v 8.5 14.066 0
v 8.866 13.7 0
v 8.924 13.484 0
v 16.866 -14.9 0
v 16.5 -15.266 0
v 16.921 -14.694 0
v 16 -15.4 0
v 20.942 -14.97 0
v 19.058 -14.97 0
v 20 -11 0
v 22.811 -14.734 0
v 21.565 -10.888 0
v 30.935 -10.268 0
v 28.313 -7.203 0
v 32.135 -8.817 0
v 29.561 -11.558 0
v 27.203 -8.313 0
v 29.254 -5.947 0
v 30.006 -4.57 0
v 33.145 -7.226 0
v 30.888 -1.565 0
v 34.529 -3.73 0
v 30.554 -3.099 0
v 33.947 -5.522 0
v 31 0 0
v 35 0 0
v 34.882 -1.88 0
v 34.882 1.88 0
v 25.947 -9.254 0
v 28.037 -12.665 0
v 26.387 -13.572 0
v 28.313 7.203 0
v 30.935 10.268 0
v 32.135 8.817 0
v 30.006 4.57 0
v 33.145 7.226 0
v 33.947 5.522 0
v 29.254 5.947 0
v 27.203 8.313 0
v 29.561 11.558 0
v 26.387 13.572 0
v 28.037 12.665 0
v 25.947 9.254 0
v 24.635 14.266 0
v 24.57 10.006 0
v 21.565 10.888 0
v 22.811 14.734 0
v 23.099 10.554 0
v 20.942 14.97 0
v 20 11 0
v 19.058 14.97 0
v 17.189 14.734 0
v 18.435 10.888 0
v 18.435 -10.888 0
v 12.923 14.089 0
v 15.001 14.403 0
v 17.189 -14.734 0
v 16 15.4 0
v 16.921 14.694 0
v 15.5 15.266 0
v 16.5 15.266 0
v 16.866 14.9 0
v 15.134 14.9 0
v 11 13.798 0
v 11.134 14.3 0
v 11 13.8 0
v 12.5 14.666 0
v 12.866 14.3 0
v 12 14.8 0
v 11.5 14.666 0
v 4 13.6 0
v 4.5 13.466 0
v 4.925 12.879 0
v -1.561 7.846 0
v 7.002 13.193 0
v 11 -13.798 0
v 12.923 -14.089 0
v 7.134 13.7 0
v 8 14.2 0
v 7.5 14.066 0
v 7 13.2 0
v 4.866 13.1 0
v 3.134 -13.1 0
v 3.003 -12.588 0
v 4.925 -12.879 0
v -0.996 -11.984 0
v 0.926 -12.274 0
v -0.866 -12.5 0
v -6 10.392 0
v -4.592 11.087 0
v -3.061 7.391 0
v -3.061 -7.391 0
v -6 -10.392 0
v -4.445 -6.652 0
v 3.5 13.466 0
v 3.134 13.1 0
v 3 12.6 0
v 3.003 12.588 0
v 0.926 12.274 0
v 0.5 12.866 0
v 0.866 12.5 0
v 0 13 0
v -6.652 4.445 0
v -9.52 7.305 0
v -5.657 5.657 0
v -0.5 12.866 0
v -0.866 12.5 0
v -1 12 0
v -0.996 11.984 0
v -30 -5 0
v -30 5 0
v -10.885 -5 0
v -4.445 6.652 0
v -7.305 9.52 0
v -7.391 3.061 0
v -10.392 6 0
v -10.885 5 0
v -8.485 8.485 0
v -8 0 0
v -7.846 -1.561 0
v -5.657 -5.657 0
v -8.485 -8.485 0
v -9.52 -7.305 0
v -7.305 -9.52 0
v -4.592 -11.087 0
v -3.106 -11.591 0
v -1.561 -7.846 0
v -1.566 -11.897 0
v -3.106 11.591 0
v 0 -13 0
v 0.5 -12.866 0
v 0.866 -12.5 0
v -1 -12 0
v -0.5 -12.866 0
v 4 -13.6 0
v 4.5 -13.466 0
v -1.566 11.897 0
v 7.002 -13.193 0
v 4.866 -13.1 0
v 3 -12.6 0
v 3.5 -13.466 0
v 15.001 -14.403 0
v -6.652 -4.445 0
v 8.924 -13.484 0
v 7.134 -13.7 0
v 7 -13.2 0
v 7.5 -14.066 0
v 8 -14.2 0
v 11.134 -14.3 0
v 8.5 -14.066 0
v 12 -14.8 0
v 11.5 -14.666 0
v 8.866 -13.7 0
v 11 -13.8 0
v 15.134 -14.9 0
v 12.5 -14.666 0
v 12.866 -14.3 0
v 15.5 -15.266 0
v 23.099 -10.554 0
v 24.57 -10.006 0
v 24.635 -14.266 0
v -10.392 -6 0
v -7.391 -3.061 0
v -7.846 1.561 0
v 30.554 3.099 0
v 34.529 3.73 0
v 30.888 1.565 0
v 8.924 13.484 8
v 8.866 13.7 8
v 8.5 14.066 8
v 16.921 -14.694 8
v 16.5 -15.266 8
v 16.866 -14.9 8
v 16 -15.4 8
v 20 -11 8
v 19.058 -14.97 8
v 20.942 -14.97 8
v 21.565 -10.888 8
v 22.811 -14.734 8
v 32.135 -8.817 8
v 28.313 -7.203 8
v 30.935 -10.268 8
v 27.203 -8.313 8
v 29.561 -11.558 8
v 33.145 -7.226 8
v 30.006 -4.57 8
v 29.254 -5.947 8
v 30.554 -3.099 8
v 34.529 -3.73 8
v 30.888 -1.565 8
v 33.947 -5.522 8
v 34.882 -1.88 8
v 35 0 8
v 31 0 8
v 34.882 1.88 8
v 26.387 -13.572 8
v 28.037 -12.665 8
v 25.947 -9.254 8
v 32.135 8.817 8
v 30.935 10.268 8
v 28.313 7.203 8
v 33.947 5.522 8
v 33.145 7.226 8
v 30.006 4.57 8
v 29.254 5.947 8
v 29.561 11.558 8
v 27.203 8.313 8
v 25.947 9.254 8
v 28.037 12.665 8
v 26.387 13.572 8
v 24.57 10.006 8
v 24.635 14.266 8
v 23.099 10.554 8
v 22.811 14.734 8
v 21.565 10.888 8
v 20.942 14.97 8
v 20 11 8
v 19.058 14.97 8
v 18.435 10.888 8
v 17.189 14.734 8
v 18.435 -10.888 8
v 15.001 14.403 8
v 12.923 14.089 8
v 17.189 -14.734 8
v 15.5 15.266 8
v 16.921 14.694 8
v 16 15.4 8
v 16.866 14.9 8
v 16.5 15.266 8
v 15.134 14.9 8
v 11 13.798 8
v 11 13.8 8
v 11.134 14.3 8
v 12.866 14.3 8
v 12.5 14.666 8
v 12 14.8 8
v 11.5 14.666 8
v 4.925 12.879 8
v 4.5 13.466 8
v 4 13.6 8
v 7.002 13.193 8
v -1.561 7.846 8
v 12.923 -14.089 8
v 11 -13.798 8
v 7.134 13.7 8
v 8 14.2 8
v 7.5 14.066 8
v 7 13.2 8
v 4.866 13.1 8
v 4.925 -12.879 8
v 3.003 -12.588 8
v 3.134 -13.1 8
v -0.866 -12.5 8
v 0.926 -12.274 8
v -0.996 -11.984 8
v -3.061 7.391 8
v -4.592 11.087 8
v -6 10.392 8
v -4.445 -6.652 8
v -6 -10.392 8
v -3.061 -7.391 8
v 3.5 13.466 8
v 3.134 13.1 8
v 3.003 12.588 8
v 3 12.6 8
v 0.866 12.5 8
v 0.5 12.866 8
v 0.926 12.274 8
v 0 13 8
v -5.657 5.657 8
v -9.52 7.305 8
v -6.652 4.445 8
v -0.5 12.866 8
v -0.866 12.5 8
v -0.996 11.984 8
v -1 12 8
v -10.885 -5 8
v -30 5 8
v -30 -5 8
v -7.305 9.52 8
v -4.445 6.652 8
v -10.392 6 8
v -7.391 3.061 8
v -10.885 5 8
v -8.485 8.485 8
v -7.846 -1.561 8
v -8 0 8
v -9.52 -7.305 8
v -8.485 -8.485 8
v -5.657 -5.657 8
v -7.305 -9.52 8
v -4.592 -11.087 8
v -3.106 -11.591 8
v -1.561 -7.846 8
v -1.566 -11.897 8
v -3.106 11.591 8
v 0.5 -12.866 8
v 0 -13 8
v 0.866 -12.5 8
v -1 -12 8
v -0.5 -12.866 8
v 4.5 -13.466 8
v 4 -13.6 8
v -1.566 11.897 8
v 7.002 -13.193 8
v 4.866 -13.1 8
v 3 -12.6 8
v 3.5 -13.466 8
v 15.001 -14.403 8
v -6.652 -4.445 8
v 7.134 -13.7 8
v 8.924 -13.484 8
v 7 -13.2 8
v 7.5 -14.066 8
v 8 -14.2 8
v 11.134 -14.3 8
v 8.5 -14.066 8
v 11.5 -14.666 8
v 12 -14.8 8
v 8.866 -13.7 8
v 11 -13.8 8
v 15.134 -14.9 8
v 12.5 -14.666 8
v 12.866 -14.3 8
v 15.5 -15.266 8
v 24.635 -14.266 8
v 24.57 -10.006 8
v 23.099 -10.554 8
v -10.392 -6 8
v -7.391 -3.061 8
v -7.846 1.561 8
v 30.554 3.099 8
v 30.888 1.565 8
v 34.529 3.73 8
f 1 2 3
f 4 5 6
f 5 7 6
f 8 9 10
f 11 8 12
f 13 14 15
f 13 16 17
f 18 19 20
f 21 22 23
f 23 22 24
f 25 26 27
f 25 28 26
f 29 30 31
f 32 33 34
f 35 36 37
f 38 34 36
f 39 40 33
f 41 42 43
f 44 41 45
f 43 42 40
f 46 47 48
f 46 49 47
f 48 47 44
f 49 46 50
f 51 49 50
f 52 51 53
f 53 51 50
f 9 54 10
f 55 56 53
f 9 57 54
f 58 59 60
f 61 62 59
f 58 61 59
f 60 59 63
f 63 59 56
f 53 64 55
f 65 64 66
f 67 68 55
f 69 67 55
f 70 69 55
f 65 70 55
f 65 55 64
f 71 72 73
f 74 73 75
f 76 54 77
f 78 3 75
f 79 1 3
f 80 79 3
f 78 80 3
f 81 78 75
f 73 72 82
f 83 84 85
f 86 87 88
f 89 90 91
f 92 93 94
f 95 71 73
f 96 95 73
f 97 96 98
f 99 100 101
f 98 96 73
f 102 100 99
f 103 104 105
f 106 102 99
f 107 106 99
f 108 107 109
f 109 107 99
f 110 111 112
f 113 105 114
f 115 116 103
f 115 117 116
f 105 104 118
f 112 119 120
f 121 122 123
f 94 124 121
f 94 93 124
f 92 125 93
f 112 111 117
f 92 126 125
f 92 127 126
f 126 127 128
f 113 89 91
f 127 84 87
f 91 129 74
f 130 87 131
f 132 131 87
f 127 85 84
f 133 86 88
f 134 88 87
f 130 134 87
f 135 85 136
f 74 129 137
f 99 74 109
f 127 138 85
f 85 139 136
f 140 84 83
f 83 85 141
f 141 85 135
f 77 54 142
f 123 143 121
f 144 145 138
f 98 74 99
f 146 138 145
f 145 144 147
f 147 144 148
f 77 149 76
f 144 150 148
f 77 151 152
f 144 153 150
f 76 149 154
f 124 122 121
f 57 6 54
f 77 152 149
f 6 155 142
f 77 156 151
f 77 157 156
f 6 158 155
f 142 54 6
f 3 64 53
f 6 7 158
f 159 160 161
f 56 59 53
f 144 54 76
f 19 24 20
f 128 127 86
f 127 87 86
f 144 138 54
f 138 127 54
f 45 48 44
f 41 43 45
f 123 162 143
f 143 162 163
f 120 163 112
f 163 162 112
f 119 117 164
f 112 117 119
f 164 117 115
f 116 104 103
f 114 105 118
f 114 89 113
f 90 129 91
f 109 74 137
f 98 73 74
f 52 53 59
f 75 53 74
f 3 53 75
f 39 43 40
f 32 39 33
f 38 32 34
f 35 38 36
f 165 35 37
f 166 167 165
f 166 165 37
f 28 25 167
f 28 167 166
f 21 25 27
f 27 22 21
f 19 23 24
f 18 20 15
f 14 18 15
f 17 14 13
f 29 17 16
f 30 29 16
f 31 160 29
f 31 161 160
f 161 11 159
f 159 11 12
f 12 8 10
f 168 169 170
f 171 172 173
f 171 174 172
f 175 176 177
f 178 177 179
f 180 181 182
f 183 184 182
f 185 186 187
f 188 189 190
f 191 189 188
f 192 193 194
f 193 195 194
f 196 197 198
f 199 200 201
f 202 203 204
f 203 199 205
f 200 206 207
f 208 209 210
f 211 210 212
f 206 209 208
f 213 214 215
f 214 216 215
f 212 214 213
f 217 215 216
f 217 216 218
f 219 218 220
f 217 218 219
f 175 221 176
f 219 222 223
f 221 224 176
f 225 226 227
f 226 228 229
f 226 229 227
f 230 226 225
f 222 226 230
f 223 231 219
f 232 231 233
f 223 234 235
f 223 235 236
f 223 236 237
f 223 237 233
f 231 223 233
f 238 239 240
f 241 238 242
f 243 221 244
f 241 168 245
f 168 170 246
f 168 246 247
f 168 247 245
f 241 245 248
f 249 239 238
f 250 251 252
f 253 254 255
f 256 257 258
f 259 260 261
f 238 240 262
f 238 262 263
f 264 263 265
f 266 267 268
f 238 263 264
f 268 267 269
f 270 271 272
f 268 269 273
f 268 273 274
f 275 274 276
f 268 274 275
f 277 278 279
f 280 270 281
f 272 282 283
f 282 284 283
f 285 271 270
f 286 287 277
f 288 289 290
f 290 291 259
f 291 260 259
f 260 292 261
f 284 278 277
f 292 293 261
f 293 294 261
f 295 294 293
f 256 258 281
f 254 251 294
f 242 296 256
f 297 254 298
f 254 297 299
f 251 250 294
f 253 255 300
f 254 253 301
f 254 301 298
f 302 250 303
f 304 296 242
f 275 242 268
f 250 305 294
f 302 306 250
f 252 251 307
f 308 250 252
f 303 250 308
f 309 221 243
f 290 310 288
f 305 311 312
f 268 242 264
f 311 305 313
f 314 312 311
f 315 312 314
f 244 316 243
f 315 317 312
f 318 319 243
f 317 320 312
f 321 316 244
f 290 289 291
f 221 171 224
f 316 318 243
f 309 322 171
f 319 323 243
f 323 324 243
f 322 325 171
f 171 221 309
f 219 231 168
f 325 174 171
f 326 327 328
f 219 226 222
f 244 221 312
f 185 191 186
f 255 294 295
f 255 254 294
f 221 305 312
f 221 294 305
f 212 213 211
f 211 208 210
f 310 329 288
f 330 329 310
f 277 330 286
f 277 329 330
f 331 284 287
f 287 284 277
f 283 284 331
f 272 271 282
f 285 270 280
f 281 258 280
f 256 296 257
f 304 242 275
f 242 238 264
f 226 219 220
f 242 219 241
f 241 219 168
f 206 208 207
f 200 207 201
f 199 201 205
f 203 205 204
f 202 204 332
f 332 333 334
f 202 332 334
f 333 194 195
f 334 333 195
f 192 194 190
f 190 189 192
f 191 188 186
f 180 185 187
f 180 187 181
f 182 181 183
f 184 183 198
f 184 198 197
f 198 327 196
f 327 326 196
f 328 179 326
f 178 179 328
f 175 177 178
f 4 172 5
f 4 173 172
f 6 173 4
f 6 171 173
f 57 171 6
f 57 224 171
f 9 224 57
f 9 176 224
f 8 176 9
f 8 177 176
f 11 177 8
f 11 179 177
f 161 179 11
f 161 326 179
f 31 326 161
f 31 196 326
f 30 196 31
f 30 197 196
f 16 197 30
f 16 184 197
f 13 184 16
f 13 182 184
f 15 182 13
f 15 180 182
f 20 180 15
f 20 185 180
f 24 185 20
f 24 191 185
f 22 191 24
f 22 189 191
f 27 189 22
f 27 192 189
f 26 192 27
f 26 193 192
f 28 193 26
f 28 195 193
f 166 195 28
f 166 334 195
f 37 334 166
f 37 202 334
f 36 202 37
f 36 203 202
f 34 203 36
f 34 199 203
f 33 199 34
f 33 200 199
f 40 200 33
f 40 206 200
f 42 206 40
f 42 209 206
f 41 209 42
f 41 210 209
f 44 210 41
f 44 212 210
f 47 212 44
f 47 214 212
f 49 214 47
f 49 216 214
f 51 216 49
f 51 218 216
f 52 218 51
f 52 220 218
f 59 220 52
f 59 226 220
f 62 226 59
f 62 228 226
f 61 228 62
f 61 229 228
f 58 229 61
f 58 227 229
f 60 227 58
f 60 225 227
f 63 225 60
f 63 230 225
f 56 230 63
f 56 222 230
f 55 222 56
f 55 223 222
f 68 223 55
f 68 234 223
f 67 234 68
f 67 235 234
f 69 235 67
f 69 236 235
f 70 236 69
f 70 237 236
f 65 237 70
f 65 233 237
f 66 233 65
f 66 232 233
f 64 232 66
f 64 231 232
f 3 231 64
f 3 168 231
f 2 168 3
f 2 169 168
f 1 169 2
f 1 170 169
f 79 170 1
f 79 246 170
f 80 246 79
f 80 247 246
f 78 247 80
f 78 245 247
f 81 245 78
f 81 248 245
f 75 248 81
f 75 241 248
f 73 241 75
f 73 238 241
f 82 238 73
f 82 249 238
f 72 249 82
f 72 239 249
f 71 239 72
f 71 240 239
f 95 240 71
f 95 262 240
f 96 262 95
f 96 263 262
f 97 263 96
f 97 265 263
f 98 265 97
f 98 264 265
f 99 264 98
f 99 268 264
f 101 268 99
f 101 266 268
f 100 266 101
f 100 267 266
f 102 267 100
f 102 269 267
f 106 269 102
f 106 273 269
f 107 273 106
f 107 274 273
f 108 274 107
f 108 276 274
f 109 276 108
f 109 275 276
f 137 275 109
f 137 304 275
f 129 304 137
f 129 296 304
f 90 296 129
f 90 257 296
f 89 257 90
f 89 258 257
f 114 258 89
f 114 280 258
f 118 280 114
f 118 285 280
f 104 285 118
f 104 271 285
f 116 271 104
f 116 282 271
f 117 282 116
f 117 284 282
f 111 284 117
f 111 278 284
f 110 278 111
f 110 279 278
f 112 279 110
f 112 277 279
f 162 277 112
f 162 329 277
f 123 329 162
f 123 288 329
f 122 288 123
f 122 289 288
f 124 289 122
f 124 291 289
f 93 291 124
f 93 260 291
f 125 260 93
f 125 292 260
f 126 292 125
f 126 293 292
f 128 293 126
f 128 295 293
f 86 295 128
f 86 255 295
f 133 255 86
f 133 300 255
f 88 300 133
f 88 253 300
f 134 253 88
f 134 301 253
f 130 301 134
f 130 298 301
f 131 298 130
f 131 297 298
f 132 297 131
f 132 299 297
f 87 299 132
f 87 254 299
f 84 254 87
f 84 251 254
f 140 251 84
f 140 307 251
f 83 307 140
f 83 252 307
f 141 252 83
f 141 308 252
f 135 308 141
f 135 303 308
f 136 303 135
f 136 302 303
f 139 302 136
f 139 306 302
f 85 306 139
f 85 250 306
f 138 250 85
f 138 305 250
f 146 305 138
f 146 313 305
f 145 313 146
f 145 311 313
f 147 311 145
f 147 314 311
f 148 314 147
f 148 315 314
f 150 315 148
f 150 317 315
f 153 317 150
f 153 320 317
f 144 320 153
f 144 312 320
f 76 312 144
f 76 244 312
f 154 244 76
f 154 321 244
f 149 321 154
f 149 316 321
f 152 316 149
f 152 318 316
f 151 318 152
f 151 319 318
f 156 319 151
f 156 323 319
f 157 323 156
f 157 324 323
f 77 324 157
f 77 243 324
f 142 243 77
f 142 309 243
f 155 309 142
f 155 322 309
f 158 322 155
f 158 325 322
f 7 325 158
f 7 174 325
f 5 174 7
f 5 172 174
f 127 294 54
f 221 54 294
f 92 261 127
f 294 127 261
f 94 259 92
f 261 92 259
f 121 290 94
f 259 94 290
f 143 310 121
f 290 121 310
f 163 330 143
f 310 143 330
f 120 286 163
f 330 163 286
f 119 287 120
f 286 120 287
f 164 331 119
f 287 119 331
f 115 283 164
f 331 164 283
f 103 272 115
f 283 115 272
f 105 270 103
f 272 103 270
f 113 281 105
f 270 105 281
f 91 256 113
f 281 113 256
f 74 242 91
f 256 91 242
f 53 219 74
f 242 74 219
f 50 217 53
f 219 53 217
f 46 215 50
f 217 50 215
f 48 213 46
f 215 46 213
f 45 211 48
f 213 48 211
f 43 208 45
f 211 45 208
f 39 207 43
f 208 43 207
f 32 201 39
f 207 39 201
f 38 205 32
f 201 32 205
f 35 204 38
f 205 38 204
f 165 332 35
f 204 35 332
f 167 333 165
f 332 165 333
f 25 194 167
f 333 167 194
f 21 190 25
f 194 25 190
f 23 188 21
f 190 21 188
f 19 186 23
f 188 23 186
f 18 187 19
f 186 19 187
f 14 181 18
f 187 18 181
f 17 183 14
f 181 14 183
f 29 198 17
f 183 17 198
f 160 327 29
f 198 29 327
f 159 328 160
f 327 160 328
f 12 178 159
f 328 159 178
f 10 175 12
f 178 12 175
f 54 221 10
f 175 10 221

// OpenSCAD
difference() {
  union() {
    linear_extrude(8,convexity=3) {
      for(g=[0:4]) {
        translate([g*4,12+g*4*(3/20)]) circle(d=2,$fn=12);
        translate([g*4,-12-g*4*(3/20)]) circle(d=2,$fn=12);
      }
      difference() {
        union() {
          hull() {
            translate([20,0]) circle(d=30,$fn=50);
            circle(d=24,$fn=48);
          }
          translate([-30,-5]) square([20,10]);
        }
        hull() {
          translate([20,0]) circle(d=22,$fn=44);
          circle(d=16,$fn=32);
        }
      }
    }
  }
}
